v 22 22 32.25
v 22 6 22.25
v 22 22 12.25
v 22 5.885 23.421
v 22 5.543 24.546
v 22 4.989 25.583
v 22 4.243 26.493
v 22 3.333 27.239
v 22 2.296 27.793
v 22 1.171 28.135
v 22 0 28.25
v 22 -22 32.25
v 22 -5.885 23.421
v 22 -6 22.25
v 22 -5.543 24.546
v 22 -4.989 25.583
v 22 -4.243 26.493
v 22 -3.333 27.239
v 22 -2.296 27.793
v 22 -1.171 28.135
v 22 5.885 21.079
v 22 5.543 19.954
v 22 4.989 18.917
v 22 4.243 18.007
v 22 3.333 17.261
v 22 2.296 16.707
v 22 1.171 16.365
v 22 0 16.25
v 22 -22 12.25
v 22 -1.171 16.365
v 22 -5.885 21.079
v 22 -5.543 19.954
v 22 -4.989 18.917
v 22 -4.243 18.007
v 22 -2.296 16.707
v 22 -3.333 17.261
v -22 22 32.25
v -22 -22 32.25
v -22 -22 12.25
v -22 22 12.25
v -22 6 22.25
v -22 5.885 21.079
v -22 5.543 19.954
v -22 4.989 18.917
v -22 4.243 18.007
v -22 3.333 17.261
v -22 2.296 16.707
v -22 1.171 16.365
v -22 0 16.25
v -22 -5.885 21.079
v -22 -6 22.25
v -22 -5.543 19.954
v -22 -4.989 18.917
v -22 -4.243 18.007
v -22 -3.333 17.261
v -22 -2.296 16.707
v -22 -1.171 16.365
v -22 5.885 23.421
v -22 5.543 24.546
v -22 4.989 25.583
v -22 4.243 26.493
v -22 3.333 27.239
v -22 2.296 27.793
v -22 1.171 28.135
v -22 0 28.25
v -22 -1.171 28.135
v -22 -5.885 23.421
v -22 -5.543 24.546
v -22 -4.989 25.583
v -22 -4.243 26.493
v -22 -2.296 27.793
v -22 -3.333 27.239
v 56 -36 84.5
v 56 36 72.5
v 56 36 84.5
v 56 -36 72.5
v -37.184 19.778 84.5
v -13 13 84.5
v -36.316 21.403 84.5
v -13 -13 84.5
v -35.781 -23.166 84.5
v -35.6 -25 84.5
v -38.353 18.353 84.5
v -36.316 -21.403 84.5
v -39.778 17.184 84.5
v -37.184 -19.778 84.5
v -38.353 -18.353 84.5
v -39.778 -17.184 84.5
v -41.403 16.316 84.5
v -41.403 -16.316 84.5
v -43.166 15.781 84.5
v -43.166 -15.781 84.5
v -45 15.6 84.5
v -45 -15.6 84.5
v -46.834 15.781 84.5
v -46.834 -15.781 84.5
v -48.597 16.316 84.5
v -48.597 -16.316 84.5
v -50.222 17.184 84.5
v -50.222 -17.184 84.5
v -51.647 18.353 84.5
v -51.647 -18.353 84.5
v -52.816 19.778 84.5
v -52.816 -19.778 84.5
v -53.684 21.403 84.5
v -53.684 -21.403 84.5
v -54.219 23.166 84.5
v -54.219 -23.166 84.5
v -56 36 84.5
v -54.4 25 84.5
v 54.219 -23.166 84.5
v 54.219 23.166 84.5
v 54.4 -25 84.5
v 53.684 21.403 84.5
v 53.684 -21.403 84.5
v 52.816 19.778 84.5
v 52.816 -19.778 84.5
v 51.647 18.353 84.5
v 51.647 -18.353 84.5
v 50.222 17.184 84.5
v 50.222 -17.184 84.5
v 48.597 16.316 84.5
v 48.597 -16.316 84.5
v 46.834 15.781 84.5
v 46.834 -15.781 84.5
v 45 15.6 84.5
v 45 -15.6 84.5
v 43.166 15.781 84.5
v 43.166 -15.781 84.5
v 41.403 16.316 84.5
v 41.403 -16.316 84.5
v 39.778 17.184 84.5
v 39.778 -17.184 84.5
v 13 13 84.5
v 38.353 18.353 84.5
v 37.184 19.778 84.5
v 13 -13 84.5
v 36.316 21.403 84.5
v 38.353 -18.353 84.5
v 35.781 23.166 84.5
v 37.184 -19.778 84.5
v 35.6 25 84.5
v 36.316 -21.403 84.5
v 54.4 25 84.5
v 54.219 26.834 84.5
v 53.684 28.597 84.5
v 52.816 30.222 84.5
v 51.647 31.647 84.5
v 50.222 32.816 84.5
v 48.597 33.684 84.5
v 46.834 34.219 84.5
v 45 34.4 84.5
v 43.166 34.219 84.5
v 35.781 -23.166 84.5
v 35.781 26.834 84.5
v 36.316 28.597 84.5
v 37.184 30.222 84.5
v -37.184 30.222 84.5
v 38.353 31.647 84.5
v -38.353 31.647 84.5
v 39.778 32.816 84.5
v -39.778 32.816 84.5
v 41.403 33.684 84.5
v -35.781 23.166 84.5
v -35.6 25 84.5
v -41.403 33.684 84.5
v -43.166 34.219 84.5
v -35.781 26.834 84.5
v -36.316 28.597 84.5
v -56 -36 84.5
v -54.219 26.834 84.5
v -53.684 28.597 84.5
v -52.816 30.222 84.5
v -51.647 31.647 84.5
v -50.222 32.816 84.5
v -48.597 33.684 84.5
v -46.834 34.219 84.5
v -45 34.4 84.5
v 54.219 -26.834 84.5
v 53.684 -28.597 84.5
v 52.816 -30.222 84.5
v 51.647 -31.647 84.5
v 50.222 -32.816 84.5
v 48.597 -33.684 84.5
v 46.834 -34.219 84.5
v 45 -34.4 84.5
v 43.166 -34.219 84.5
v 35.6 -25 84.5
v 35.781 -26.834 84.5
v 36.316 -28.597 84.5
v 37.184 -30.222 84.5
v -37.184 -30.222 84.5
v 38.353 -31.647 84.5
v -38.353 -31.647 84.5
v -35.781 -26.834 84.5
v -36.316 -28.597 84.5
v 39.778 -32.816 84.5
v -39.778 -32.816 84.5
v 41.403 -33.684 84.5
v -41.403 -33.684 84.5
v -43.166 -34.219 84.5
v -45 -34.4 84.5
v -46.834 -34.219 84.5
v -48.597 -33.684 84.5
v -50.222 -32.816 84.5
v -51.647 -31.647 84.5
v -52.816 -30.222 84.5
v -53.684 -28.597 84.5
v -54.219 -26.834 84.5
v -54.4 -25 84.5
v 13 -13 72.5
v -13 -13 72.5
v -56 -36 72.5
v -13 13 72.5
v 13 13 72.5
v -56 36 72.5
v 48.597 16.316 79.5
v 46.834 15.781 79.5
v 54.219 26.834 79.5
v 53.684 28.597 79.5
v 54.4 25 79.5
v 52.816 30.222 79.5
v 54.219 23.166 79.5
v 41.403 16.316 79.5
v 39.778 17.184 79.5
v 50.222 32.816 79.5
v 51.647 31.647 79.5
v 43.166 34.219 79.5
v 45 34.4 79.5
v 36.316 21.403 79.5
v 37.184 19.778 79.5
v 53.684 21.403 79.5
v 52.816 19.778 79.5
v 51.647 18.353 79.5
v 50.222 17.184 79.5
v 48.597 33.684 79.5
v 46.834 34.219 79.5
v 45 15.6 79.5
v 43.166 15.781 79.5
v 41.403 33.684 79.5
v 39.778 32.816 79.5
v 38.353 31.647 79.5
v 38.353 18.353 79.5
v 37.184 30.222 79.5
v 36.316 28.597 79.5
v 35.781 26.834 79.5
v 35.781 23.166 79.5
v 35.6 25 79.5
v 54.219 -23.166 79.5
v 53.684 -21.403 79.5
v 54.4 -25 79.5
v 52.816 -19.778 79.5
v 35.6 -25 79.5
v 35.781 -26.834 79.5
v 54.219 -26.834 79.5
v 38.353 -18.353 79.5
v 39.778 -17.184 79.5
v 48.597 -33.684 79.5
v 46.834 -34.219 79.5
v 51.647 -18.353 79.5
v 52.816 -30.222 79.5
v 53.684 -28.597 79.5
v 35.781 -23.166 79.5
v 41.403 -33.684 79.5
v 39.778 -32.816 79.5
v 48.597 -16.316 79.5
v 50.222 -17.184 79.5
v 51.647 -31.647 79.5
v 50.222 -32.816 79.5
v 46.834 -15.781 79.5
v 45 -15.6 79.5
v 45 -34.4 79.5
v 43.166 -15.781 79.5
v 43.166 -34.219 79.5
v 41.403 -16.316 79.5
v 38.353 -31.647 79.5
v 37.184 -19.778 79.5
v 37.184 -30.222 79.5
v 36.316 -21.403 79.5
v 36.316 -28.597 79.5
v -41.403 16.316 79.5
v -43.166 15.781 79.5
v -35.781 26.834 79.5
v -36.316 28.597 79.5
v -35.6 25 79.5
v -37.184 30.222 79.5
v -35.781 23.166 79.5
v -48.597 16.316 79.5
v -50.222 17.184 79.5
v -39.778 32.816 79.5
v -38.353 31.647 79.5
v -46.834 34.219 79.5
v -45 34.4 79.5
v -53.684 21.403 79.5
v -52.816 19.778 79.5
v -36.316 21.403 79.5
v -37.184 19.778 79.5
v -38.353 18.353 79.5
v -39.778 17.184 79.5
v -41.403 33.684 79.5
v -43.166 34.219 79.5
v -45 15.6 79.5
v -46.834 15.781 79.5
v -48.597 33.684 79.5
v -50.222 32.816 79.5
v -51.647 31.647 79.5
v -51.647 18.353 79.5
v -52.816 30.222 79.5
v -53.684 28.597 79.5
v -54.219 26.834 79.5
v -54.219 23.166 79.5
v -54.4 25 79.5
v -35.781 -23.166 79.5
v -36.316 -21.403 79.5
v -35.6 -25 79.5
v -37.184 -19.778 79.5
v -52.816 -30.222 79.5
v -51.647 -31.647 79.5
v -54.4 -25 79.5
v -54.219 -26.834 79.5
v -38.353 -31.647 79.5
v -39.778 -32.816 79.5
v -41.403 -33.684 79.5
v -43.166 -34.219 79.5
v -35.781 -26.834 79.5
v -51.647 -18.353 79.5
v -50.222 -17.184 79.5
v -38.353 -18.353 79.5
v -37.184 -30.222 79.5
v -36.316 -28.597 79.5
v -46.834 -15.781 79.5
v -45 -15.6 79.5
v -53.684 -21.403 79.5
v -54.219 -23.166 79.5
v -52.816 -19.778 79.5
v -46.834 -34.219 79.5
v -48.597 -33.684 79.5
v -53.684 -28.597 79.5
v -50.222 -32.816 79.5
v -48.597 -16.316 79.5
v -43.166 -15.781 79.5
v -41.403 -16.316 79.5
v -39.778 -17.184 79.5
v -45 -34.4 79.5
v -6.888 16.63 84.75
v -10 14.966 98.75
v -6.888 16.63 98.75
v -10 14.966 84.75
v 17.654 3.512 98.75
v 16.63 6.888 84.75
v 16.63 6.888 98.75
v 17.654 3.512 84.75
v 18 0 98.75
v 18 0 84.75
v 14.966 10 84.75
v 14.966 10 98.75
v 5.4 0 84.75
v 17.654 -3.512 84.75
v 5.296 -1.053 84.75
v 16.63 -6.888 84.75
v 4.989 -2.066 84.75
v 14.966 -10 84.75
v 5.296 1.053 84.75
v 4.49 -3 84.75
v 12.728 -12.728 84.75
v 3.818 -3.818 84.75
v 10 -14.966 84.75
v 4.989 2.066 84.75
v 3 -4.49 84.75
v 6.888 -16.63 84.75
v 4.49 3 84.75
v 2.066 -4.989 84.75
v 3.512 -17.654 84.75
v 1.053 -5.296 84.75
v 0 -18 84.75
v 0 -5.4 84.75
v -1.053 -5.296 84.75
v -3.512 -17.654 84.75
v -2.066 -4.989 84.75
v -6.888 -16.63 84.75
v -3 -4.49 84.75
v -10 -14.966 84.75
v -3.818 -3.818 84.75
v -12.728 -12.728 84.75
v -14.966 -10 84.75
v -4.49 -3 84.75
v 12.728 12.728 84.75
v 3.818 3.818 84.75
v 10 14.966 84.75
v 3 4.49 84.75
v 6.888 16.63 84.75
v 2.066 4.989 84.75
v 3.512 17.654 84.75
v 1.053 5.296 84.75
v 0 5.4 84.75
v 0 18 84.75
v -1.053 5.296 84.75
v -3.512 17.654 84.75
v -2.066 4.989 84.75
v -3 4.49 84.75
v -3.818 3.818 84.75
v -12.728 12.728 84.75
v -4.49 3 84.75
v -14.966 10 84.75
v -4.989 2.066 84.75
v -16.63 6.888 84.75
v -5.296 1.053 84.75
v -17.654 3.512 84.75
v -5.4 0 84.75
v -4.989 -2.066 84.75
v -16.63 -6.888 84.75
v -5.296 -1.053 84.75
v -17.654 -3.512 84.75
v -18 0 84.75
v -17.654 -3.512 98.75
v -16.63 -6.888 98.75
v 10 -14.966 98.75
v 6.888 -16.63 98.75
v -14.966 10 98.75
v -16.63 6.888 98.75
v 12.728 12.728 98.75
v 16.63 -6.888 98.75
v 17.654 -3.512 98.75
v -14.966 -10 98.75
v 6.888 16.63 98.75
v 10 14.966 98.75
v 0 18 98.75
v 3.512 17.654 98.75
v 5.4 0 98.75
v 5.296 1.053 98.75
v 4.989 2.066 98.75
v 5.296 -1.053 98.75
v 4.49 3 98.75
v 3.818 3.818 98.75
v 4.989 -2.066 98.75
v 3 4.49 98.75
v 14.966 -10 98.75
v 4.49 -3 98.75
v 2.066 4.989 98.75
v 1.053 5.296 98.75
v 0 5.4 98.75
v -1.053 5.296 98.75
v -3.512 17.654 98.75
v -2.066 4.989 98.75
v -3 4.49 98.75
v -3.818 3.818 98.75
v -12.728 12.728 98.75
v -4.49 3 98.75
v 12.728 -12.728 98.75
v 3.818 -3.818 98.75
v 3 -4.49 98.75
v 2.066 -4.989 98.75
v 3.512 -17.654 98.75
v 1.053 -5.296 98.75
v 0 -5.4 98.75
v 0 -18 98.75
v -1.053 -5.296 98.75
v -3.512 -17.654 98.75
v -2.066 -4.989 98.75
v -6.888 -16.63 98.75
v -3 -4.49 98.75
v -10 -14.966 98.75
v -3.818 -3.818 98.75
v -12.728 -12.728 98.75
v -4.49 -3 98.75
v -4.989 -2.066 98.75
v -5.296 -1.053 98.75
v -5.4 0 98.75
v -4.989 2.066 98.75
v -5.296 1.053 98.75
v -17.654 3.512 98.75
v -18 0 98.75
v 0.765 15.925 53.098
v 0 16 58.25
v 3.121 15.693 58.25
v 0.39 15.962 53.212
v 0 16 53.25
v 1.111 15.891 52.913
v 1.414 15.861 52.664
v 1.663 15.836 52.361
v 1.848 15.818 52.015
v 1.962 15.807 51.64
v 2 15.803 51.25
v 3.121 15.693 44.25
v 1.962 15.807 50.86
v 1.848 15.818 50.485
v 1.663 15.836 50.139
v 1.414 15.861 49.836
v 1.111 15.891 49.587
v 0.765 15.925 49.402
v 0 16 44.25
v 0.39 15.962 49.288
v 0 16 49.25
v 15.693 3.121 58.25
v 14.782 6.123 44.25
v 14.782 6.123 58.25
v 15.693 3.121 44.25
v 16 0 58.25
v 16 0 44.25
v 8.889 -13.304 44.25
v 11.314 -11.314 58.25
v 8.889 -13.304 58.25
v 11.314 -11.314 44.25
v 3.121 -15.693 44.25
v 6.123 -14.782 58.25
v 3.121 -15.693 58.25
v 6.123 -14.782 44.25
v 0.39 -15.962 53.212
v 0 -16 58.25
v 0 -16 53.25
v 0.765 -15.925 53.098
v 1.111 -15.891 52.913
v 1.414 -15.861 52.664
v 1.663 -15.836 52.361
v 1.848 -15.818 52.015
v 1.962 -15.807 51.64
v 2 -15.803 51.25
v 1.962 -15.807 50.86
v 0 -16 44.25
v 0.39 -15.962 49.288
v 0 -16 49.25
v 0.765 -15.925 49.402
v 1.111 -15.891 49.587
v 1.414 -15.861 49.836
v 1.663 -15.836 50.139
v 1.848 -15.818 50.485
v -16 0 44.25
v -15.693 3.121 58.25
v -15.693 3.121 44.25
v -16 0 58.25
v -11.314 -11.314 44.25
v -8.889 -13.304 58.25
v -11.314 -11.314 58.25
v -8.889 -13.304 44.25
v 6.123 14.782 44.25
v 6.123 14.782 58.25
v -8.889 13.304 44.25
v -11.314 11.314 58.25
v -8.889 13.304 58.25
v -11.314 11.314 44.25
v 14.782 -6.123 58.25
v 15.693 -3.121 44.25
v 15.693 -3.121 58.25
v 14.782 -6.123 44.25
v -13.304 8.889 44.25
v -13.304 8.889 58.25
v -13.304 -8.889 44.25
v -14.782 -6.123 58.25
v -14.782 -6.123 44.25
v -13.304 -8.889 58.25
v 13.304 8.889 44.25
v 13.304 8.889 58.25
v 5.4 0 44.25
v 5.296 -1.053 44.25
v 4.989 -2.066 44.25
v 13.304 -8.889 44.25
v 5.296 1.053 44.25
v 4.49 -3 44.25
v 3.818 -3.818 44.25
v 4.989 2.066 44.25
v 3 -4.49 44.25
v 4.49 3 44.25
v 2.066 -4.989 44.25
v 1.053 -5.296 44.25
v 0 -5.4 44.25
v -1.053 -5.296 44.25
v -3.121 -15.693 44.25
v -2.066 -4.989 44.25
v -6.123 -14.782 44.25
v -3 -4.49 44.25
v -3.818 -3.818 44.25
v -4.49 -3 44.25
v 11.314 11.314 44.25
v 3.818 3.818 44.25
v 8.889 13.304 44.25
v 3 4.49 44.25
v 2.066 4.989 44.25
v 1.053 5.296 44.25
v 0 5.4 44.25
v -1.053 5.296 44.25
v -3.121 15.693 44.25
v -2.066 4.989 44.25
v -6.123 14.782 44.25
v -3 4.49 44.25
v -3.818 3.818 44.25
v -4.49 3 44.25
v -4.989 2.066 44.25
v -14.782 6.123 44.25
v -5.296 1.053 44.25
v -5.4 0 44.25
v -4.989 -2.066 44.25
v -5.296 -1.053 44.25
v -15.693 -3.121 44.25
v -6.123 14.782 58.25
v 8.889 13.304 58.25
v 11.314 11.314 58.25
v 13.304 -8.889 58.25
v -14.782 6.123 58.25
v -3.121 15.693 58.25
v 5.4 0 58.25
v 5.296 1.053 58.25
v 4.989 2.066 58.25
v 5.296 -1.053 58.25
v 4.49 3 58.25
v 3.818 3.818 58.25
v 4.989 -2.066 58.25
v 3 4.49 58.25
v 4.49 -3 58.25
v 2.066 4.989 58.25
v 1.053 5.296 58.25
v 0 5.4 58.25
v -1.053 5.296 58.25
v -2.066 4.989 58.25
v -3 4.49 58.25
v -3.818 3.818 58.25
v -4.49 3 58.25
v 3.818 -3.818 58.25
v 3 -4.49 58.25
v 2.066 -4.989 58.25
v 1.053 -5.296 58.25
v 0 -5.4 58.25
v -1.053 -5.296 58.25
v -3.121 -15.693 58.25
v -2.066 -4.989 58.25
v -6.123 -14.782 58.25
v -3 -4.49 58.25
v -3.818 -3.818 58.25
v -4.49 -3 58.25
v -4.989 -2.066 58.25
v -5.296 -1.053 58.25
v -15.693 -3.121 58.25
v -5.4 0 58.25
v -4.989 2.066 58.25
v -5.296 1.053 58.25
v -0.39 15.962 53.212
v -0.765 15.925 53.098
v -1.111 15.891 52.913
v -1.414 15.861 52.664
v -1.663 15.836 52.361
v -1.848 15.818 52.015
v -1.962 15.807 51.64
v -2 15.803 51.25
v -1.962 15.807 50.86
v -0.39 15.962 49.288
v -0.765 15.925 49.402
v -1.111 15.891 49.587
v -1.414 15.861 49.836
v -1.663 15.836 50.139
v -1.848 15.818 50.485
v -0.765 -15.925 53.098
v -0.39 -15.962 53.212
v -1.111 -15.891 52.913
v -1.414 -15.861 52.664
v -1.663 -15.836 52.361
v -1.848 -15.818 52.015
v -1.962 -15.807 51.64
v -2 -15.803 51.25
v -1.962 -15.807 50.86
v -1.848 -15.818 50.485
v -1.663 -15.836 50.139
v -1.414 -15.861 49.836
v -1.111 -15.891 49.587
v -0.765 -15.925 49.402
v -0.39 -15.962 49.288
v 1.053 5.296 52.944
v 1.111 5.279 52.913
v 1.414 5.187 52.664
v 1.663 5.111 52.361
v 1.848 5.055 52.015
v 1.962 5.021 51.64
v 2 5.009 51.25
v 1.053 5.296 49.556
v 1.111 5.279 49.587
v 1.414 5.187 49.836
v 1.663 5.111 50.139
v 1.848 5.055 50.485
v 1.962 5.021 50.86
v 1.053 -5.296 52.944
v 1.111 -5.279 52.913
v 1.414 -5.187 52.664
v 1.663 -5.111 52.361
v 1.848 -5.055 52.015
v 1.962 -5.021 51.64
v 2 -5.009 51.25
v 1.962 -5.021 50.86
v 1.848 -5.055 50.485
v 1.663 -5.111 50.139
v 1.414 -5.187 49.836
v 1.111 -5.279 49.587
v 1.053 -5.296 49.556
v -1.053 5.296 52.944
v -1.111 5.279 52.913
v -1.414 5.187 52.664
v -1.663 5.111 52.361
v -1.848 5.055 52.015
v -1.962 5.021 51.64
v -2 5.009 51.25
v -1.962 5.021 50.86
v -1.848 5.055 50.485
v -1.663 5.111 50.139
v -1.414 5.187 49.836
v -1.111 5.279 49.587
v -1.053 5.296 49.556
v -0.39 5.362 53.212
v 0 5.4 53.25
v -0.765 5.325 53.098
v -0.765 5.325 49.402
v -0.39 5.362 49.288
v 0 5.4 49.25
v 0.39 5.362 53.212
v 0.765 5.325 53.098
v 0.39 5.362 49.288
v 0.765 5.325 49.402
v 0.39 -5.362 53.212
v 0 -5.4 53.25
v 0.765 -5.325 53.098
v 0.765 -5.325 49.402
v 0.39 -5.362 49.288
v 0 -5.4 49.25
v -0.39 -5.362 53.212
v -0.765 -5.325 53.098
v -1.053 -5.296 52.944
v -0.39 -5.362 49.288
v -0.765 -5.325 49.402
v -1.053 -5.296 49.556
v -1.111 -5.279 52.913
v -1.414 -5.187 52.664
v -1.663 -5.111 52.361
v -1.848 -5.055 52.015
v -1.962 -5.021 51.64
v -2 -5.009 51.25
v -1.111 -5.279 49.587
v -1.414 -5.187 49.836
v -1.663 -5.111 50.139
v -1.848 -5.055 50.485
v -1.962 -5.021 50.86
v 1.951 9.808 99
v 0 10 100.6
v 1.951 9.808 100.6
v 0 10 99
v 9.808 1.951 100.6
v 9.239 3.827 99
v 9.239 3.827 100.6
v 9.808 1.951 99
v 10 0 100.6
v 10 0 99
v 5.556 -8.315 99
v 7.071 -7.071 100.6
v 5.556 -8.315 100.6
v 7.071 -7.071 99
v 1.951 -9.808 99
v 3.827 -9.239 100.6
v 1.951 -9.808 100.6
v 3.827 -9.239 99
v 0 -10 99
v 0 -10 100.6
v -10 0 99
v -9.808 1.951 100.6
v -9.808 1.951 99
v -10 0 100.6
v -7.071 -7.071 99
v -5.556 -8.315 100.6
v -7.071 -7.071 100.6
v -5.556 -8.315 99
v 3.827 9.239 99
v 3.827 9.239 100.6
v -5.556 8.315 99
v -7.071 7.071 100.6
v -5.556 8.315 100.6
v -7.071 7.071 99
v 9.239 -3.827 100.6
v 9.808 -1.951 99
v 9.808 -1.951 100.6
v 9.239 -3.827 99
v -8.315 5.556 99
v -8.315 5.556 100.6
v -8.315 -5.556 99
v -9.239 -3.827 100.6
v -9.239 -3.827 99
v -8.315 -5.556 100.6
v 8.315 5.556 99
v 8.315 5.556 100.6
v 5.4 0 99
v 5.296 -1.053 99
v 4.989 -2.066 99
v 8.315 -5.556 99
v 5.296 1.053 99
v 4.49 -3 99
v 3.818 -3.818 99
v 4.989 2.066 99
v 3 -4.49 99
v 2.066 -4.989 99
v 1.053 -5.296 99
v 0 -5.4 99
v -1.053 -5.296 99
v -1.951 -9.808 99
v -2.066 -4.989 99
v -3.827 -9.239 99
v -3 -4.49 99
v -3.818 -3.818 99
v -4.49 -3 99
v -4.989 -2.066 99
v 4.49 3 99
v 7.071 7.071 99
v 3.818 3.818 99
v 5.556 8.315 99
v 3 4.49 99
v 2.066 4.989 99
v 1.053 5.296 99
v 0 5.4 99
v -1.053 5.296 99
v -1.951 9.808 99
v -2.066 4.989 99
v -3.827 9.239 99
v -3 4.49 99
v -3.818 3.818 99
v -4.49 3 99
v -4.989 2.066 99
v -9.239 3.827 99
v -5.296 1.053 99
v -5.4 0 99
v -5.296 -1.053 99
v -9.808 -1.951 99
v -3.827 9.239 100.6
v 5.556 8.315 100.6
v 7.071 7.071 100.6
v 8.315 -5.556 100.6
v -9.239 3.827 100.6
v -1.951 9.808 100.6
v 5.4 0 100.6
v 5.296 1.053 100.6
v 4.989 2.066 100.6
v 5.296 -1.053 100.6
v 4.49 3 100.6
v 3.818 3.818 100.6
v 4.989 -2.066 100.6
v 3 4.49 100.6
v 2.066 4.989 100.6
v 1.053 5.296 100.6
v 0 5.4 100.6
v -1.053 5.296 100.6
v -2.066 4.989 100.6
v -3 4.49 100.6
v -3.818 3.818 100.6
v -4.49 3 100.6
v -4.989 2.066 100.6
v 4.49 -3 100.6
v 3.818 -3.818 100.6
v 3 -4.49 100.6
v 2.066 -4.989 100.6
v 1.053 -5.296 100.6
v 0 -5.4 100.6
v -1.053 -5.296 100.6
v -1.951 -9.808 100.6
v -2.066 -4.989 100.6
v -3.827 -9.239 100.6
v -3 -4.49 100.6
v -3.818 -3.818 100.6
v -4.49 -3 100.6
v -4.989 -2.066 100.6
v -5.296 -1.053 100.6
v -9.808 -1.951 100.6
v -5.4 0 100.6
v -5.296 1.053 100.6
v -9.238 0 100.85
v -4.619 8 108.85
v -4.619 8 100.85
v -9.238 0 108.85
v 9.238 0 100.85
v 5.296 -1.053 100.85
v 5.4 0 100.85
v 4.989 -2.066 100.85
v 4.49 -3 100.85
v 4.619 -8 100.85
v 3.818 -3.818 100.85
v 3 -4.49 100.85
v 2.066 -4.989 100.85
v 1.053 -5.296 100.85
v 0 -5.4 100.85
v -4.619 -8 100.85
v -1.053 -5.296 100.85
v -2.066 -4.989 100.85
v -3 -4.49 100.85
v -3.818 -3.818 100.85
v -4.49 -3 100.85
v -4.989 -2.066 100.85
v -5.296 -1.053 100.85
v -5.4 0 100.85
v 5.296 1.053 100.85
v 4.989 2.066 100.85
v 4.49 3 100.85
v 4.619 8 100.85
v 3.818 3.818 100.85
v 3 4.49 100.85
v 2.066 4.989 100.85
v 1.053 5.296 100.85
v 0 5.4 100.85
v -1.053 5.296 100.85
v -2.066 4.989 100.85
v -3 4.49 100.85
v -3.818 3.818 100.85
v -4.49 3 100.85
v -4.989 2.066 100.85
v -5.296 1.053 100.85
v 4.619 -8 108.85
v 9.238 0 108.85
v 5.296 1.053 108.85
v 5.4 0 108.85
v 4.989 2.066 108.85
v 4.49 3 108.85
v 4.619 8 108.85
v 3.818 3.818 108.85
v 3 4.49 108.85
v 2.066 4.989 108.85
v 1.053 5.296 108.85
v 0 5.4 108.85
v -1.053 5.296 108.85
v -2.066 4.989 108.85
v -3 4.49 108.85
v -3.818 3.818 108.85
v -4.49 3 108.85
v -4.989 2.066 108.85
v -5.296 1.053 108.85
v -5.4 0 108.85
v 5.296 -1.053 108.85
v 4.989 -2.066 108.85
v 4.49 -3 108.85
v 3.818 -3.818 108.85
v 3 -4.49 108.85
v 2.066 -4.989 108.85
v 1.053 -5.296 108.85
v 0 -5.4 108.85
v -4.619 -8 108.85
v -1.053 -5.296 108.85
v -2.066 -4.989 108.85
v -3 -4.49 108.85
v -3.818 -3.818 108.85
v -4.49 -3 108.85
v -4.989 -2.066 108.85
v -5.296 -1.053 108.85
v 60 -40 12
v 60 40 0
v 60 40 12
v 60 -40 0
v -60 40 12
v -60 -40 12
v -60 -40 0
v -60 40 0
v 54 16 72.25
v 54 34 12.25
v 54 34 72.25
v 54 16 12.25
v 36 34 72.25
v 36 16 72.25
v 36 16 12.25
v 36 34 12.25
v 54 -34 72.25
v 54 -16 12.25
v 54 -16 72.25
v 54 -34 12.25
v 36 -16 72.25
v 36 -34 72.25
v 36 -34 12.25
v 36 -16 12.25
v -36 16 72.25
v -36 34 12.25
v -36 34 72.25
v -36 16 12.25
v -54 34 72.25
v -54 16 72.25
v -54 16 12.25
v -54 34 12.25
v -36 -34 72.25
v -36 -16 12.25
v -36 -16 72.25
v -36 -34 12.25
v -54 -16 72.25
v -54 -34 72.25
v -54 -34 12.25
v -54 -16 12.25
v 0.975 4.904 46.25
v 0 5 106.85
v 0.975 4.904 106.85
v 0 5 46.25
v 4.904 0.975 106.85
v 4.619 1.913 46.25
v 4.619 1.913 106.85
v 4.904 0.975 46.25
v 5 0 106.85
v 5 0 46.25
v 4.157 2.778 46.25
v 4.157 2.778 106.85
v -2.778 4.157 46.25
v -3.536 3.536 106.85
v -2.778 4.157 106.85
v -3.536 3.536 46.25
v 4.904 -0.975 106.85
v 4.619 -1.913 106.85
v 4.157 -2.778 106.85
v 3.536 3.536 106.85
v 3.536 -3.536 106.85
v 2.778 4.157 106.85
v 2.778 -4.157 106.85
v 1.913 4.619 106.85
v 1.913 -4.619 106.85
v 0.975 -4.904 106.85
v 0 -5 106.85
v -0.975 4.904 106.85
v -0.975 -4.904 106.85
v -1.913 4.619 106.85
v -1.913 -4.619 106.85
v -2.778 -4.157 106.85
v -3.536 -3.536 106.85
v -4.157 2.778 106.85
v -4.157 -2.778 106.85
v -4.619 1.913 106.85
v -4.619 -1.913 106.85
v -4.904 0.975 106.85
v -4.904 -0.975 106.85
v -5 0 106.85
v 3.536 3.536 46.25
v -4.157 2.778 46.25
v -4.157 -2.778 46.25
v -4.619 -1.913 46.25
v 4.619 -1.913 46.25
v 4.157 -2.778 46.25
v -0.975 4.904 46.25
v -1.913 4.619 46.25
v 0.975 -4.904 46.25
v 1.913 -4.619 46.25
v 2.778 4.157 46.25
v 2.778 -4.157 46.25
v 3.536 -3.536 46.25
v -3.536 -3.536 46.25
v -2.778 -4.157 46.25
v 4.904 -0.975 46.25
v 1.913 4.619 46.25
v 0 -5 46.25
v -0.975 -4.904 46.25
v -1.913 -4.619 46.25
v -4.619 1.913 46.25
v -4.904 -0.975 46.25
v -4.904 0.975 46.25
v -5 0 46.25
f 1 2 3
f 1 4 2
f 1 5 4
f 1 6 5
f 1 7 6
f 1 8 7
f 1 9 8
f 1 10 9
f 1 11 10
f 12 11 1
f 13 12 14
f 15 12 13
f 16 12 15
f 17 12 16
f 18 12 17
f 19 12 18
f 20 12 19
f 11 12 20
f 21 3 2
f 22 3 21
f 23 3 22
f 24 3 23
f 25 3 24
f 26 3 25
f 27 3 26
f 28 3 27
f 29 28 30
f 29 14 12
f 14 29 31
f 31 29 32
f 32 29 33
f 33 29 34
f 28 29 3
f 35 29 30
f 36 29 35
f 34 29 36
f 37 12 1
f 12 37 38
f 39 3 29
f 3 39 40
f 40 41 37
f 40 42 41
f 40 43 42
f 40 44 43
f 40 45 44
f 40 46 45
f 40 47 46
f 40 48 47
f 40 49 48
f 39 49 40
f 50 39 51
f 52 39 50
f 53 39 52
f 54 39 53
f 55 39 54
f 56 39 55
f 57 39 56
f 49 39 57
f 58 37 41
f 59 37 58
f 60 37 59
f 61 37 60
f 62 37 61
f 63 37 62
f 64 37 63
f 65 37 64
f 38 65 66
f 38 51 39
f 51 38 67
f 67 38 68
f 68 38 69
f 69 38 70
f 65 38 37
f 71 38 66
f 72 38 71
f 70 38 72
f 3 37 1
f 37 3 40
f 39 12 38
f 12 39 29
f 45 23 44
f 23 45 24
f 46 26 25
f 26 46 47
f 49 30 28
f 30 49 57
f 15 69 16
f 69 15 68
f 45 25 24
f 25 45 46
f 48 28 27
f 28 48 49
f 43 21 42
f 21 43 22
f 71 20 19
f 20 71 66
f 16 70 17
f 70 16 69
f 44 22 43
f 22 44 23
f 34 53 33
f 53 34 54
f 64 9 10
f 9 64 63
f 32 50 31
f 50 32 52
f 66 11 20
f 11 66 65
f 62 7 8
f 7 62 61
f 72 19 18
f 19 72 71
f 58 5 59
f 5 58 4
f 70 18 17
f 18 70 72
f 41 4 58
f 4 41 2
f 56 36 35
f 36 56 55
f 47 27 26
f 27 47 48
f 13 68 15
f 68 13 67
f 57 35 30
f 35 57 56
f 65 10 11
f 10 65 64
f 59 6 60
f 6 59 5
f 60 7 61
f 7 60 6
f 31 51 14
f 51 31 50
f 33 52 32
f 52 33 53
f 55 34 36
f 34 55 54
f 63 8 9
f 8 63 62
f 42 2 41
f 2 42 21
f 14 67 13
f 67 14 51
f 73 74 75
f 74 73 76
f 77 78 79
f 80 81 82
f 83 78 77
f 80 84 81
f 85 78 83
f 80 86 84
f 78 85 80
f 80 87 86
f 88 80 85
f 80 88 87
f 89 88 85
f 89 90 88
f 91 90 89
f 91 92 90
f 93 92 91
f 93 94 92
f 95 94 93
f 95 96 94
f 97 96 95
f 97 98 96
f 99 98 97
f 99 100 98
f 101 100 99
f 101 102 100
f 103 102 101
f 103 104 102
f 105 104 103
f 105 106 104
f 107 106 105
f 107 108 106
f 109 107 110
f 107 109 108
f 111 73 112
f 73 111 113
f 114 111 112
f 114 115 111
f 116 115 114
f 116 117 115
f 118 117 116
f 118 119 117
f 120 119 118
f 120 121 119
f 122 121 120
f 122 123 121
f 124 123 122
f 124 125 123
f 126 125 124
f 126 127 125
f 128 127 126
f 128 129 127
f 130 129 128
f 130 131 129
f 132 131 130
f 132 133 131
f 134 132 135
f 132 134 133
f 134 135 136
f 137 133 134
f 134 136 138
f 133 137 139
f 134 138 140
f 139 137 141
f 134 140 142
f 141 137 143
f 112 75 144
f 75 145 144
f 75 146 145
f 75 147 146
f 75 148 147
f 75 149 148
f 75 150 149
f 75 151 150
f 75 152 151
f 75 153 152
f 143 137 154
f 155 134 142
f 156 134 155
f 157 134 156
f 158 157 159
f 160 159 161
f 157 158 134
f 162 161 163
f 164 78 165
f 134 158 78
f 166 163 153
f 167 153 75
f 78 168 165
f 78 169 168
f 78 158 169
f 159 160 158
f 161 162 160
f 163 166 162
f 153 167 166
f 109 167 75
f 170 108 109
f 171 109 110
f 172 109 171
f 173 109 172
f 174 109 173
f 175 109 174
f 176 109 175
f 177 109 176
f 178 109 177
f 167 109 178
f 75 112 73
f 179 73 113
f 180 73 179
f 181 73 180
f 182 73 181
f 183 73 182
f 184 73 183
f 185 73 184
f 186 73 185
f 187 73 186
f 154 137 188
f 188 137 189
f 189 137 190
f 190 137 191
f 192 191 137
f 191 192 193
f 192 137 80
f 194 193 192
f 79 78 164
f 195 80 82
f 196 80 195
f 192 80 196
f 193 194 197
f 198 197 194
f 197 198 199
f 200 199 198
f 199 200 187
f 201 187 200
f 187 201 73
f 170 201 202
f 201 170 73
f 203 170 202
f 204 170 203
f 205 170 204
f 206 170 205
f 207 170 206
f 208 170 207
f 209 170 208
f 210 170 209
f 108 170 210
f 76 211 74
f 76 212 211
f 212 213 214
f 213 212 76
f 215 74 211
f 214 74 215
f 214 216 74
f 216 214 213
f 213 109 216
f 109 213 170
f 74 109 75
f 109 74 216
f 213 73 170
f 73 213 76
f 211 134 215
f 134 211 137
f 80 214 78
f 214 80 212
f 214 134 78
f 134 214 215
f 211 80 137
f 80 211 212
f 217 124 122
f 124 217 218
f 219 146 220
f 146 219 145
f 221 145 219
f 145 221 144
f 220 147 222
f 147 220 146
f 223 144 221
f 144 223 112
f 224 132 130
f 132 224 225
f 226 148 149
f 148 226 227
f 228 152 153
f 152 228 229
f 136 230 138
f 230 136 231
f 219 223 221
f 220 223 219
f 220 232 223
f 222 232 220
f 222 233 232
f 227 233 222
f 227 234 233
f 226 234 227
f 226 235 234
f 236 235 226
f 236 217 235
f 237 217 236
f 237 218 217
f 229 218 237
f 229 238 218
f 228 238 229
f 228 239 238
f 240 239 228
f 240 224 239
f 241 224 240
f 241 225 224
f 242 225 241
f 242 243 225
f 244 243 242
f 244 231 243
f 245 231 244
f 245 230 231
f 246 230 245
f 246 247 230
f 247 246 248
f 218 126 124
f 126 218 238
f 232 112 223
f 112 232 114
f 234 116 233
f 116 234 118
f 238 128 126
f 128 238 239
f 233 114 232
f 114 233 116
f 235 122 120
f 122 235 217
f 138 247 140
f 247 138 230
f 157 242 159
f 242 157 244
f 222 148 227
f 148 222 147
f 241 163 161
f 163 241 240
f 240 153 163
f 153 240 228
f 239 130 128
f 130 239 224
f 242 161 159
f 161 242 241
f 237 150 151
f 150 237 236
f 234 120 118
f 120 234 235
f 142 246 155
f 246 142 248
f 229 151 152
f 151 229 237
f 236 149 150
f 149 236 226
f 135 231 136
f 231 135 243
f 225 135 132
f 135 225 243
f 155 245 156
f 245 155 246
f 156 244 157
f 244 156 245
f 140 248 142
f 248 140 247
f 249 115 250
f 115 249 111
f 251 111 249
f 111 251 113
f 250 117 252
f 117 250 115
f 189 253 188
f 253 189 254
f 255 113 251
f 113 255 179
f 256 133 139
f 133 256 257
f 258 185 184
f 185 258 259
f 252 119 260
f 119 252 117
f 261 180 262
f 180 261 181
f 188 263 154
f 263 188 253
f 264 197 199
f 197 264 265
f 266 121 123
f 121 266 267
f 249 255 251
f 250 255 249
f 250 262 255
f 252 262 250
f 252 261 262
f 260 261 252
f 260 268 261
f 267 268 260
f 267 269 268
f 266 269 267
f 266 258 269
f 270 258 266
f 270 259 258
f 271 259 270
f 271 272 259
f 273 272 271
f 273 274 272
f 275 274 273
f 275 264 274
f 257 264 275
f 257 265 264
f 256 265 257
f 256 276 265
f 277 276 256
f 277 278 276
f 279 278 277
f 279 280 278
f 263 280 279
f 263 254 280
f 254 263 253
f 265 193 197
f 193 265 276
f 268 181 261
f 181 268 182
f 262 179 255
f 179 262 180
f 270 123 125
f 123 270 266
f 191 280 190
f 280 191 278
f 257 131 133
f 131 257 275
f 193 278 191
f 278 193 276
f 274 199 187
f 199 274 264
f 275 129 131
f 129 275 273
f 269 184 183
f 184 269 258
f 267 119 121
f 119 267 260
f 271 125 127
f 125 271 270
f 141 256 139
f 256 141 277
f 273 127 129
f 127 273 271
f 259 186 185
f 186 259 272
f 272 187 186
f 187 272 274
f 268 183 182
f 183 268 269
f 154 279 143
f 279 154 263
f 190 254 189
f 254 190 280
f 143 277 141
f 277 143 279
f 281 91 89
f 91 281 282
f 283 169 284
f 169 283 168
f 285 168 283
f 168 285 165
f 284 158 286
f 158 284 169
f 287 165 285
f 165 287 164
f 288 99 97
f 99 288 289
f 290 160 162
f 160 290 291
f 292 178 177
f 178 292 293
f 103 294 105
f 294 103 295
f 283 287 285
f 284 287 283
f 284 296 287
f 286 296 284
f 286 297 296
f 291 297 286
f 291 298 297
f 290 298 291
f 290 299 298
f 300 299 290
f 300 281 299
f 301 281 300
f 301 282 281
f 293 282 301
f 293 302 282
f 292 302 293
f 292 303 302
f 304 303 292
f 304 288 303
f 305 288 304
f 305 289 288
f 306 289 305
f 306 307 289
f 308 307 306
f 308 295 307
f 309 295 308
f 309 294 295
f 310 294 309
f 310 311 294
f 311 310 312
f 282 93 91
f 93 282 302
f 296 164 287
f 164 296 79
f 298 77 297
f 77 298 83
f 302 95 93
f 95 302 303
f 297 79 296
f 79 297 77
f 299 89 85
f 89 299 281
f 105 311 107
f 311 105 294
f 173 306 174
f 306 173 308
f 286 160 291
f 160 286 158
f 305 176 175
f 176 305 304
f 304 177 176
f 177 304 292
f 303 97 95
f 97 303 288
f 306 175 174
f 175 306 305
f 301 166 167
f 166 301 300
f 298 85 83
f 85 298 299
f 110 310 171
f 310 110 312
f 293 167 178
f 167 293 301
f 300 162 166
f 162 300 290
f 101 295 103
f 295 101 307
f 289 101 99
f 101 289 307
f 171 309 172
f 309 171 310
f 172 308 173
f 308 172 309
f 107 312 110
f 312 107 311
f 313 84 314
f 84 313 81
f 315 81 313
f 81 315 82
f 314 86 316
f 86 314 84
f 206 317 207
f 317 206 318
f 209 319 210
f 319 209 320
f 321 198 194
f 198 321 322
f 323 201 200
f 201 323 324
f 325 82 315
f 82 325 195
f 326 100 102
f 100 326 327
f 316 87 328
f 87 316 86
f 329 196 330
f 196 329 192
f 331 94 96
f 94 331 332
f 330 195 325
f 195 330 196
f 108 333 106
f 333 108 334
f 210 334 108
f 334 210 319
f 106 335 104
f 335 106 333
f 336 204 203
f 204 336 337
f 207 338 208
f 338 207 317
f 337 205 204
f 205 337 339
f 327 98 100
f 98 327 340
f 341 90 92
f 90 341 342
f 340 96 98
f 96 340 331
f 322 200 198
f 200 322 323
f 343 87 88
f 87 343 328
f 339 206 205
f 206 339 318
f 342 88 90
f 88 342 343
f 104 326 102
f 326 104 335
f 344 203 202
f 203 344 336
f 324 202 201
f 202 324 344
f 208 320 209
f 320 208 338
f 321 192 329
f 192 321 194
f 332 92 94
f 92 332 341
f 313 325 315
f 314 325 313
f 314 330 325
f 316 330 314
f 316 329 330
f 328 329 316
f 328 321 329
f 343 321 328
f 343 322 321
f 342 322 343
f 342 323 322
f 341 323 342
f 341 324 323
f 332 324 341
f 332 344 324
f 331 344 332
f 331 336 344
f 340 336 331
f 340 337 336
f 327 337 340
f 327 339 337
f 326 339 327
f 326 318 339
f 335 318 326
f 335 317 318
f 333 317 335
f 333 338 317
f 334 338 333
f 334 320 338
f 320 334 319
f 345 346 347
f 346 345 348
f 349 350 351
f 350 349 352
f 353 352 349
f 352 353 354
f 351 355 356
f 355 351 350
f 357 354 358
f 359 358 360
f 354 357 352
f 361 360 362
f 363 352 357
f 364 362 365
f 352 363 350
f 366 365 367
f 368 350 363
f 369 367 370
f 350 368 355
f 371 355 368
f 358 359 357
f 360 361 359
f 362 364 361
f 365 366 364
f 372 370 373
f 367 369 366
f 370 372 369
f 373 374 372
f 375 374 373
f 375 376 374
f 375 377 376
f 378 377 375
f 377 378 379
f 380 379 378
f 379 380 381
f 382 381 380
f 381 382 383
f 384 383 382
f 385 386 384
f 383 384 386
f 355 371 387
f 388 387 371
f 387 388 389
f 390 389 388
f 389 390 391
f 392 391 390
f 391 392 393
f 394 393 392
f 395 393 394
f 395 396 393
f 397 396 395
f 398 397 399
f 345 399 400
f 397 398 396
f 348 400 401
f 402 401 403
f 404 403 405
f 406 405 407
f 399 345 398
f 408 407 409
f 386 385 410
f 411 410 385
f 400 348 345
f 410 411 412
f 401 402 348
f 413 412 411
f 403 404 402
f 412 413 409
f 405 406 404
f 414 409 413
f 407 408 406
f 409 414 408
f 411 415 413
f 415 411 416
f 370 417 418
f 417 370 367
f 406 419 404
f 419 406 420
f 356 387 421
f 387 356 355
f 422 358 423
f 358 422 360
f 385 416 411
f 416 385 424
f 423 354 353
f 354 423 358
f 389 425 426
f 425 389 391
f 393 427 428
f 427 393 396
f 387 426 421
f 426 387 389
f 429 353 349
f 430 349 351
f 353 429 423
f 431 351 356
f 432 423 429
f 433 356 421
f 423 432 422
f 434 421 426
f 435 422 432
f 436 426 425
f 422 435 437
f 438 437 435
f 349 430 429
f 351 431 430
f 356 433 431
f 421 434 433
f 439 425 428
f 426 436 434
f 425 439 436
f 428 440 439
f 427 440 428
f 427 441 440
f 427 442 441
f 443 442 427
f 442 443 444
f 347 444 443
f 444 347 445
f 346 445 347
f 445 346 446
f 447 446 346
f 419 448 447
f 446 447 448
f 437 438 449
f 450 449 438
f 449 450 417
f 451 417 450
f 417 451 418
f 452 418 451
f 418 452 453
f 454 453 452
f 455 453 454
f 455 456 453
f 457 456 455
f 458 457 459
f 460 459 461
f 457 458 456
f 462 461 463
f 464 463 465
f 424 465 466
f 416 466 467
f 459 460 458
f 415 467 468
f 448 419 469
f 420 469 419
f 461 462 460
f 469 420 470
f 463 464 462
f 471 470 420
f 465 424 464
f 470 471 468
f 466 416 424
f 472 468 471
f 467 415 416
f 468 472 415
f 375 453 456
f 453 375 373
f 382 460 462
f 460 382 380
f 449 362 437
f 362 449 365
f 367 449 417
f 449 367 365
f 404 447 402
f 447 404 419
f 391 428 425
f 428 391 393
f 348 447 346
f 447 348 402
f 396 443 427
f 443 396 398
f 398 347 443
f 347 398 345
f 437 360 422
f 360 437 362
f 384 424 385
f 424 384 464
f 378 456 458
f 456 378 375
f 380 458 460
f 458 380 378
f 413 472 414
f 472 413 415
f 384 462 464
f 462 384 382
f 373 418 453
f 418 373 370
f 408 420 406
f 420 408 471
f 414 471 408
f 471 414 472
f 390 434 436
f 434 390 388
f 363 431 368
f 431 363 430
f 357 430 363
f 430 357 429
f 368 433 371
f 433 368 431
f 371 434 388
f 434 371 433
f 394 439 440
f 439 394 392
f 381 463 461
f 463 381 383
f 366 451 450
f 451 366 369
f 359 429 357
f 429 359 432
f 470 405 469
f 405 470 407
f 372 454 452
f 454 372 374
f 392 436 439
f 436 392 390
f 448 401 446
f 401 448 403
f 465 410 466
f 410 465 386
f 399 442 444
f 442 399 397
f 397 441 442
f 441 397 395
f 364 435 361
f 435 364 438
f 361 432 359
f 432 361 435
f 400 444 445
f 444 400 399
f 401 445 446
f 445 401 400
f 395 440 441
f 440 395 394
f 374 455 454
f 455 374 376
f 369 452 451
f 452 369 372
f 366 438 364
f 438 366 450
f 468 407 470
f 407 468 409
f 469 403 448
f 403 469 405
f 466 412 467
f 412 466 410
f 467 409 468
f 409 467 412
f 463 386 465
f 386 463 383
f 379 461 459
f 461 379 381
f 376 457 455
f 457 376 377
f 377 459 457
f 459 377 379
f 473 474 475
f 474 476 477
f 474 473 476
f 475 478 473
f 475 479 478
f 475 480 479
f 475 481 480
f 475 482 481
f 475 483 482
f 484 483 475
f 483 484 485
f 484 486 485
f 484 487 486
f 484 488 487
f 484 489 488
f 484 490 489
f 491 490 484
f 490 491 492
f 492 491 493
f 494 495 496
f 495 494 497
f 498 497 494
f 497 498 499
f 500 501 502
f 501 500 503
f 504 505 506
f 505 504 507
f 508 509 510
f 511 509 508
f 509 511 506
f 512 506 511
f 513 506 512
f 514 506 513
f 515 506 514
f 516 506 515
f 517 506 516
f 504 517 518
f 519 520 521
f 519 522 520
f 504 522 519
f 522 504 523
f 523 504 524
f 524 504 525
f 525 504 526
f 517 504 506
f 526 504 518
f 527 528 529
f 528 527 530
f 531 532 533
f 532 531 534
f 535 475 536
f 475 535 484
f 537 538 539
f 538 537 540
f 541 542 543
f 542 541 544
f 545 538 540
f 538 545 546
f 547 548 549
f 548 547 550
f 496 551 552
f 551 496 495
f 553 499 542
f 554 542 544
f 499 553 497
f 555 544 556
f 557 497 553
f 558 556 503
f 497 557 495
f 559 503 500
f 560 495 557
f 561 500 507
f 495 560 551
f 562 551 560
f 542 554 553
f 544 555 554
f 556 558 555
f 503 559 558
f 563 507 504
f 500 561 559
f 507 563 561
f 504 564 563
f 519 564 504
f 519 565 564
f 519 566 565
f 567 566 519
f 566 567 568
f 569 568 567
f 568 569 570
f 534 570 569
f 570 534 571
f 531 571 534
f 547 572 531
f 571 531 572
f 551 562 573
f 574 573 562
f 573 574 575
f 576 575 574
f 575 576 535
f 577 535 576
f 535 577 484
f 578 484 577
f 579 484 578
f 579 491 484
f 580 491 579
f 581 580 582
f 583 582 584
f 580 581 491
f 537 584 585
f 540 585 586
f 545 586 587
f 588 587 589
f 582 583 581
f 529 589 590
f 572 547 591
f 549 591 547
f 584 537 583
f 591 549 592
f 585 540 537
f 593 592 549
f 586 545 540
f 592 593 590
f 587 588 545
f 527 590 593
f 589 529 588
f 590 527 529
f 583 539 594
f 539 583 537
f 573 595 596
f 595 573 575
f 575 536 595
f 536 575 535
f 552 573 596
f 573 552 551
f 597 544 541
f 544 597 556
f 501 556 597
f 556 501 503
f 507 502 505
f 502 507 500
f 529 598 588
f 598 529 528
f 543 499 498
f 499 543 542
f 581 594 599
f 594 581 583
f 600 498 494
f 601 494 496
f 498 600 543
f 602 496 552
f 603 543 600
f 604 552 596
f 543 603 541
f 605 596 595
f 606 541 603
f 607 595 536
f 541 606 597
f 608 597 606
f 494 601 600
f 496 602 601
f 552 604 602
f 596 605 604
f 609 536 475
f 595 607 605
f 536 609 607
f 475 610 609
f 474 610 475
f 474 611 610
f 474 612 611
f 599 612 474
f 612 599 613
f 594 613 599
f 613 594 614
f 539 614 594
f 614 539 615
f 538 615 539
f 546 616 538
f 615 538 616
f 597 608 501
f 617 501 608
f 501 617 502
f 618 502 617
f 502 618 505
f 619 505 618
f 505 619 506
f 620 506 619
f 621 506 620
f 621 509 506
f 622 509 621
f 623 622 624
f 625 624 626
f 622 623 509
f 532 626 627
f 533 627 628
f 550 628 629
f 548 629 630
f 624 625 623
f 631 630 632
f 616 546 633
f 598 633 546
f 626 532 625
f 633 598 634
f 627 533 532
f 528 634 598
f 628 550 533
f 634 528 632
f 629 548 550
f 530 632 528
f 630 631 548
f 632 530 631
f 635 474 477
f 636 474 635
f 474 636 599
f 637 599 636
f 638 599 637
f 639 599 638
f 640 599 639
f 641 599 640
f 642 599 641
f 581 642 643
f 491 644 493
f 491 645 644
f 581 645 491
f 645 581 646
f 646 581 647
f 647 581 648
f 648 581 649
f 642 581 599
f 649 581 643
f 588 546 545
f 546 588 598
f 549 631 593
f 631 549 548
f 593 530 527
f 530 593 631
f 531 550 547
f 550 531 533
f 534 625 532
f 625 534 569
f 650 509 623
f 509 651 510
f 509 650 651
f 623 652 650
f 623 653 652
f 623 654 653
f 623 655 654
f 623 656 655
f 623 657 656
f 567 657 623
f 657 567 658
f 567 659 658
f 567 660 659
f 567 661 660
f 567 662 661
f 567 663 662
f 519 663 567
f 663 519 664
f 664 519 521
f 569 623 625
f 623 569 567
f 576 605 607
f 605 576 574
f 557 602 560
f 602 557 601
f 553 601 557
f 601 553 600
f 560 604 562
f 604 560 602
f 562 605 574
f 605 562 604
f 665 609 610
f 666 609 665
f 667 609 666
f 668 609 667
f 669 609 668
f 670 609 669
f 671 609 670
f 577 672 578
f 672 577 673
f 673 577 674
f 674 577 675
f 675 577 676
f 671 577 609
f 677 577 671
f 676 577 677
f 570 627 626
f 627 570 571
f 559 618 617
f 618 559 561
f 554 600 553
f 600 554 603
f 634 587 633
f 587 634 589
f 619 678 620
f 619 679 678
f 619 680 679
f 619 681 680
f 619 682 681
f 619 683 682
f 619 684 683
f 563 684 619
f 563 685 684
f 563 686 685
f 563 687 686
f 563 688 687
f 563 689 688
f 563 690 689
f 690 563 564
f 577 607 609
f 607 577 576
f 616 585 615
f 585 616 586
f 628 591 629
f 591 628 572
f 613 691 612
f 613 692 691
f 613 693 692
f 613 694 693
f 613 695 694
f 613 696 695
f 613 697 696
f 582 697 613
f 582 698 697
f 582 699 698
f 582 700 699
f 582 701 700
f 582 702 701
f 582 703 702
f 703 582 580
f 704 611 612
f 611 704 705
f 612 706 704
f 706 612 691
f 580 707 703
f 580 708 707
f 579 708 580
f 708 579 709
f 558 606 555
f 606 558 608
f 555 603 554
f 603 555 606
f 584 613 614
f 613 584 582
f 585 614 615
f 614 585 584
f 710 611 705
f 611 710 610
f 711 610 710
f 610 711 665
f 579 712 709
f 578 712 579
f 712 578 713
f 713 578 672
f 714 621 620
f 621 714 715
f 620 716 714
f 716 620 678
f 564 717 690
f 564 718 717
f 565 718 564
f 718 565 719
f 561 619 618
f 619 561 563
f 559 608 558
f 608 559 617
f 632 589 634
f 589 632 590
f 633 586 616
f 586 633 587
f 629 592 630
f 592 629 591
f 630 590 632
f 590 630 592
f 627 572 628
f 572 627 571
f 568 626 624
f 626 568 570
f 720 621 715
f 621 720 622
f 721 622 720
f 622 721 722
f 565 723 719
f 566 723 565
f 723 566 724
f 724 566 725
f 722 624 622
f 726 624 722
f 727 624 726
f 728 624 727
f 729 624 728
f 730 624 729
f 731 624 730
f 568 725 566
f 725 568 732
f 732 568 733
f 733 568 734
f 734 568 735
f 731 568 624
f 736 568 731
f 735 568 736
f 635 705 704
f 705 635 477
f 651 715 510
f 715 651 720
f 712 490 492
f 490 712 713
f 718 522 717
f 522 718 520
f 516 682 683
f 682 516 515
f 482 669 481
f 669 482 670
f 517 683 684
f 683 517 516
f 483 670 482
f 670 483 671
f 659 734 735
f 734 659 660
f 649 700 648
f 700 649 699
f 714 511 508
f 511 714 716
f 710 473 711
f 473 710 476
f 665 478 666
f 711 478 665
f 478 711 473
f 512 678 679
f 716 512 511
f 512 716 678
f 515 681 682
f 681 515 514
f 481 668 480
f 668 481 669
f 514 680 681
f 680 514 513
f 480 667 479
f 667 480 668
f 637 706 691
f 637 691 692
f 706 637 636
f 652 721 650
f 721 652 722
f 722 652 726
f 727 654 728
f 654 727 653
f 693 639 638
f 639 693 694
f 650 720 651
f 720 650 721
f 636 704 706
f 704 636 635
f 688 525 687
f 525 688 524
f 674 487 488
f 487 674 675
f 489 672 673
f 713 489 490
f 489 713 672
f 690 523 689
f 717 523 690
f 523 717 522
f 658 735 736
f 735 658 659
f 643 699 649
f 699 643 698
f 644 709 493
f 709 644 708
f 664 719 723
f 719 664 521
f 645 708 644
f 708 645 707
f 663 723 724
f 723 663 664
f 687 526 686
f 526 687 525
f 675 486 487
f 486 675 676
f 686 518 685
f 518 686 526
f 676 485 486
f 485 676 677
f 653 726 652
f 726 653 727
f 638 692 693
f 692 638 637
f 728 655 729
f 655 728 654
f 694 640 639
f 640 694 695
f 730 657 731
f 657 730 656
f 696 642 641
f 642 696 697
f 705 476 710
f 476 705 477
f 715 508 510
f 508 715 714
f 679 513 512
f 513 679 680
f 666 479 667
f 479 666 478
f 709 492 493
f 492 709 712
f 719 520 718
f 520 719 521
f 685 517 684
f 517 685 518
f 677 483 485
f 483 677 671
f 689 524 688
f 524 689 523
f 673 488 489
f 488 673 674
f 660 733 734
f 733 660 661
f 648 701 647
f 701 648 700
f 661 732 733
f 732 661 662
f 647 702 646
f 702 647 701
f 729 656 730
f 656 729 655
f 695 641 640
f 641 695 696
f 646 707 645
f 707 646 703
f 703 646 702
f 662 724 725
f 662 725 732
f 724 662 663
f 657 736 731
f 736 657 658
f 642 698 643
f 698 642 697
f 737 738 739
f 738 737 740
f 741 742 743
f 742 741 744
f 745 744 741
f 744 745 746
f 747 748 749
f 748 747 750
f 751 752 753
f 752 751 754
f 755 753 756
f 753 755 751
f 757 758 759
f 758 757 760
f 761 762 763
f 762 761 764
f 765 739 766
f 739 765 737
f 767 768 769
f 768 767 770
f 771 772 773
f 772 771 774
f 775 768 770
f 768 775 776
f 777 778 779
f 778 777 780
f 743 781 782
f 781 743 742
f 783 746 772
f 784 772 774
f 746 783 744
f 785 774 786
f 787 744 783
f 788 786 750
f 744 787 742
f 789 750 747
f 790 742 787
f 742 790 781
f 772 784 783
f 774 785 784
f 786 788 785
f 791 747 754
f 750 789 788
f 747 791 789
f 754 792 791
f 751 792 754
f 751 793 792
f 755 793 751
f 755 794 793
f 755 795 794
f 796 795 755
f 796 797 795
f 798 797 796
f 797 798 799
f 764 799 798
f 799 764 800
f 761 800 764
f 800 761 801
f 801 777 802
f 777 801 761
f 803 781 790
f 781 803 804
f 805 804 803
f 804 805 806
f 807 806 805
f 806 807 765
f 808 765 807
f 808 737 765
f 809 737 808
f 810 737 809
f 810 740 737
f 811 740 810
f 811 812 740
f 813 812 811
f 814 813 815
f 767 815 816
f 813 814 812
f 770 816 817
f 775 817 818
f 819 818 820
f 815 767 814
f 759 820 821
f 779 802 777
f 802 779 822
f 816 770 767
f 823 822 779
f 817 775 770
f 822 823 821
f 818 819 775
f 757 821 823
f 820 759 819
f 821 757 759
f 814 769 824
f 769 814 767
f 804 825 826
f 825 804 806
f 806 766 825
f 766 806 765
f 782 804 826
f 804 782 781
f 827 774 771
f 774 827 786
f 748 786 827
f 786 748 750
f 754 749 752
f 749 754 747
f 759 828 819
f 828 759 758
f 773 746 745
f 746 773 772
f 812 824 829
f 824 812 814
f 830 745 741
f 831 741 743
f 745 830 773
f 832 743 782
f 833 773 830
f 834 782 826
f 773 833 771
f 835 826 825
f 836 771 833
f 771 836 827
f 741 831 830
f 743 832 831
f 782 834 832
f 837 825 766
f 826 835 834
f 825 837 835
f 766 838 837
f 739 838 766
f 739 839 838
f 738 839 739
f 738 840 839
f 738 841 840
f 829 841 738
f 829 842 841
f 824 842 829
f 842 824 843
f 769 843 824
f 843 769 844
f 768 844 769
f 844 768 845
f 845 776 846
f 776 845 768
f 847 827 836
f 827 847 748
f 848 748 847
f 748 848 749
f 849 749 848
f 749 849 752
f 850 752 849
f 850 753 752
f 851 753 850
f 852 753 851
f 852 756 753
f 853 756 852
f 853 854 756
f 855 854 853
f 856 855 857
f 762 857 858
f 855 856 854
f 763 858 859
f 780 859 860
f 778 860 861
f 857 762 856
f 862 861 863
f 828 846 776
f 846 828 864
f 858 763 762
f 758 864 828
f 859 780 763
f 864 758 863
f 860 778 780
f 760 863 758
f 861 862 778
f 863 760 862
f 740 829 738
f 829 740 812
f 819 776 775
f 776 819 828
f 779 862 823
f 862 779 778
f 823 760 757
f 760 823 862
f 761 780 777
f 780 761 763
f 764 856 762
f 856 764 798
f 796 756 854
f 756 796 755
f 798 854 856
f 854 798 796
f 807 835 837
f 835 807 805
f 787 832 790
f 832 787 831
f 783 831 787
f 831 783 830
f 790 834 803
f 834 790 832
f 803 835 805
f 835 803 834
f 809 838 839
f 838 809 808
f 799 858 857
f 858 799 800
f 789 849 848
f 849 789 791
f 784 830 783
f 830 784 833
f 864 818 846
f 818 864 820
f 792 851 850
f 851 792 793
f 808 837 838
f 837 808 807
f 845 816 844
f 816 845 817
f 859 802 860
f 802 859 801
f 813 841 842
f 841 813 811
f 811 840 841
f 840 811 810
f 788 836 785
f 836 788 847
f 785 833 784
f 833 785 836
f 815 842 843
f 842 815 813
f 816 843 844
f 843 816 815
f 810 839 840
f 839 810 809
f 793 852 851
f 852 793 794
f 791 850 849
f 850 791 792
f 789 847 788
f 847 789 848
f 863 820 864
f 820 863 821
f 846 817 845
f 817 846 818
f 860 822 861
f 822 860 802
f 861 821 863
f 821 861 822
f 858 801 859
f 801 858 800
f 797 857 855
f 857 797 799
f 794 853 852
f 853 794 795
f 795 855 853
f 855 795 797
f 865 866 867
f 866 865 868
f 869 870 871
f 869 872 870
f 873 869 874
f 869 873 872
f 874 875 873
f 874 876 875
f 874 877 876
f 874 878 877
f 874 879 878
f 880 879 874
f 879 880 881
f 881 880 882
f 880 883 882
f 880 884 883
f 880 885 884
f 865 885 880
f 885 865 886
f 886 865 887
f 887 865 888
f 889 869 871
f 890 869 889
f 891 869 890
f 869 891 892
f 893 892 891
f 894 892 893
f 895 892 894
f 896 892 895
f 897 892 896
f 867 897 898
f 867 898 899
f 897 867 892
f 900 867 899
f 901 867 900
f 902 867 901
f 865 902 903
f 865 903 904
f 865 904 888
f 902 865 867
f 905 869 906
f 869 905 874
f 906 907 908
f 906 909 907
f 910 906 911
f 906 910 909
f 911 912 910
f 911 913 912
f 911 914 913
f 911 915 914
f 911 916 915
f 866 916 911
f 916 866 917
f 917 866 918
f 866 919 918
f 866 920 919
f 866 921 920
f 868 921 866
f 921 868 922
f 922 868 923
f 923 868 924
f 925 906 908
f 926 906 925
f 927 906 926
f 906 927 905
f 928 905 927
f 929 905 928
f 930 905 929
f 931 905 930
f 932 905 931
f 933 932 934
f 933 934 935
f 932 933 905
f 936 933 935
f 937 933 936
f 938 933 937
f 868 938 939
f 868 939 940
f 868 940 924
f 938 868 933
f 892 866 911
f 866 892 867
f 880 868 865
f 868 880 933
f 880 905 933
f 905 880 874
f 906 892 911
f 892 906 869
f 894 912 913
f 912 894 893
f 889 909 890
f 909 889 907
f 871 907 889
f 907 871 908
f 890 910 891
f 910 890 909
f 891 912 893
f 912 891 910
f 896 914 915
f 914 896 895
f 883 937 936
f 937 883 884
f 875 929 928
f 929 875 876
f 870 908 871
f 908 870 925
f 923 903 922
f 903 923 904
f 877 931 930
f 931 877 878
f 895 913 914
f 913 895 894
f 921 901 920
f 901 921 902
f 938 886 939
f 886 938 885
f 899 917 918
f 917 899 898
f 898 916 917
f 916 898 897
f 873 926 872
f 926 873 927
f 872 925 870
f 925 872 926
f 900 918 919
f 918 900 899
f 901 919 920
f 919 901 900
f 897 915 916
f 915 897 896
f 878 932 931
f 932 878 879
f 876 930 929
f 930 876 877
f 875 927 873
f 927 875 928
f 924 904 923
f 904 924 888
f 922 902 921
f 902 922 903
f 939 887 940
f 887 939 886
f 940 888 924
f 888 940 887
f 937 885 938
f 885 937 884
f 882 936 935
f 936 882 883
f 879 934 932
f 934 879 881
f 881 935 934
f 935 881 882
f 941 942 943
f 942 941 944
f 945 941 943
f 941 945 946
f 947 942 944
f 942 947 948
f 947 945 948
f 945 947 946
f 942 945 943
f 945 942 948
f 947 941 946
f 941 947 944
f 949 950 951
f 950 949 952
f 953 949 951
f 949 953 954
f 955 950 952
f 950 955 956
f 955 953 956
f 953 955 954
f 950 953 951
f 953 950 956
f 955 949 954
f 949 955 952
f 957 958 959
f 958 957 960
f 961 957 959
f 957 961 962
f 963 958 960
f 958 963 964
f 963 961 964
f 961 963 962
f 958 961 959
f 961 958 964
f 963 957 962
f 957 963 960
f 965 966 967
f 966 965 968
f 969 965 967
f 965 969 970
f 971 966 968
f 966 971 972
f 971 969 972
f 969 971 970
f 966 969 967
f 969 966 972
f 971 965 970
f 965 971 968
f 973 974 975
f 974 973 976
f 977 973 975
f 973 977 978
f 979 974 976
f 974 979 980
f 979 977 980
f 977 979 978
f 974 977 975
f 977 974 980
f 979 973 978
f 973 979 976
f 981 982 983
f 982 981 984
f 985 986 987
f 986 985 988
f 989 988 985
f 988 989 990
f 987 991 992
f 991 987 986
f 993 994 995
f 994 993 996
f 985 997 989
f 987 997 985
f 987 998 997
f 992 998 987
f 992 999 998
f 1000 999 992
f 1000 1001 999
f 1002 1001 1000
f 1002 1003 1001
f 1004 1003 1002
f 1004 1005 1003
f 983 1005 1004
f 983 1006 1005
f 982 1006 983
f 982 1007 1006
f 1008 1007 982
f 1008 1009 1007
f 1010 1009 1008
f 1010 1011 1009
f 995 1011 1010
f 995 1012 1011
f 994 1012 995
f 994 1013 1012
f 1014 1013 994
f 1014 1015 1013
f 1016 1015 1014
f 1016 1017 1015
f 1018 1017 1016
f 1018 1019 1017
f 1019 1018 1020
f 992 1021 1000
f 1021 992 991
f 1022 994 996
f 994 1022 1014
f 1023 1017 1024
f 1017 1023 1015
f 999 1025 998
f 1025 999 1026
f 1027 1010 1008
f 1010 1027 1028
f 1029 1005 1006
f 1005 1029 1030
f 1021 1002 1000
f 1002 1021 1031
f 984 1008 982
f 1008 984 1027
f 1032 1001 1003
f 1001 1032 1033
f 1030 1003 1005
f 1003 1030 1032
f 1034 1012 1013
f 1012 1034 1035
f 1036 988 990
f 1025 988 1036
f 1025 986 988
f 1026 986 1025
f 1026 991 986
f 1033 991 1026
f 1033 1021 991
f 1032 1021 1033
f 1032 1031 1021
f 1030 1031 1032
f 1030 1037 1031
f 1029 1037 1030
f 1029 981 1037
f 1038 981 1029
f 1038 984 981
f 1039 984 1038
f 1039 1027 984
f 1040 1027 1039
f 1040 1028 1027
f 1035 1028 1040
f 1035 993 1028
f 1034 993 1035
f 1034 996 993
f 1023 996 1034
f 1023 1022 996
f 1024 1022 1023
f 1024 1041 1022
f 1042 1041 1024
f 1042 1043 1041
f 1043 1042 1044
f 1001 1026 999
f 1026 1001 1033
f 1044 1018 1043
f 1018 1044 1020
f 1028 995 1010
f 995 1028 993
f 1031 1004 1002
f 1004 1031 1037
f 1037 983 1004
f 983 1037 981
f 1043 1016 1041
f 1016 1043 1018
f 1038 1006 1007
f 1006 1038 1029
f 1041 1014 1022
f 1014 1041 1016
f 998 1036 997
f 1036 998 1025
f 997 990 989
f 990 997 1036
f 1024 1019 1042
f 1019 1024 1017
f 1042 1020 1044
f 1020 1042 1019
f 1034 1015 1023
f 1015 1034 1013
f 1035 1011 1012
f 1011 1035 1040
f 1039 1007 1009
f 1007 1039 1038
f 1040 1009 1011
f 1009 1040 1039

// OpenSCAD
$fn = 32;

// ------------------------------------------------------------------------
// Arbor press fixture: screw d10, posts 60 mm, gap 12 mm
// Every part is its own module, assembly() places every instance.
// ------------------------------------------------------------------------

// --- part 1 ---
module press_bed() {
  difference() {
    translate([-60, -40, 0]) cube([120, 80, 12]);
  }
}

// --- part 2 ---
module anvil_block() {
  difference() {
    translate([-22, -22, 0]) cube([44, 44, 20]);
    translate([0, 0, 10]) rotate([0, 90, 0]) cylinder(h = 46, d = 12, center = true);
  }
}

// --- part 3 ---
module press_post_a() {
  translate([-9, -9, 0]) cube([18, 18, 60]);
}

// --- part 4 ---
module press_post_b() {
  translate([-9, -9, 0]) cube([18, 18, 60]);
}

// --- part 5 ---
module press_post_c() {
  translate([-9, -9, 0]) cube([18, 18, 60]);
}

// --- part 6 ---
module press_post_d() {
  translate([-9, -9, 0]) cube([18, 18, 60]);
}

// --- part 7 ---
module press_frame() {
  difference() {
    translate([-56, -36, 0]) cube([112, 72, 12]);
    translate([-13, -13, -1]) cube([26, 26, 14]);
    translate([45, 25, 7]) cylinder(h = 6, d = 18.8);
    translate([45, -25, 7]) cylinder(h = 6, d = 18.8);
    translate([-45, 25, 7]) cylinder(h = 6, d = 18.8);
    translate([-45, -25, 7]) cylinder(h = 6, d = 18.8);
  }
}

// --- part 8 ---
module guide_ring() {
  difference() {
      translate([0, 0, 0]) cylinder(h = 14, d = 36);
      translate([0, 0, -1]) cylinder(h = 16, d = 10.8);
    }
}

// --- part 9 ---
module press_screw() {
  translate([0, 0, -30.3]) cylinder(h = 60.6, d = 10);
}

// --- part 10 ---
module press_head() {
  difference() {
    cylinder(h = 14, d = 32);
    translate([0, 0, -1]) cylinder(h = 16, d = 10.8);
    translate([0, 0, 7]) rotate([90, 0, 0]) cylinder(h = 34, d = 4, center = true);
  }
}

// --- part 11 ---
module nut_washer() {
  difference() {
      translate([0, 0, 0]) cylinder(h = 1.6, d = 20);
      translate([0, 0, -1]) cylinder(h = 3.6, d = 10.8);
    }
}

// --- part 12 ---
module press_nut() {
  difference() {
    linear_extrude(height = 8) polygon(points = [[9.238, 0], [4.619, 8], [-4.619, 8], [-9.238, 0], [-4.619, -8], [4.619, -8]]);
    translate([0, 0, -1]) cylinder(h = 10, d = 10.8);
  }
}

// --- assembly ---
module assembly() {
  color([0.80, 0.24, 0.20]) translate([0, 0, 0]) rotate([0, 0, 0]) press_bed();
  color([0.20, 0.45, 0.75]) translate([0, 0, 12.25]) rotate([0, 0, 0]) anvil_block();
  color([0.25, 0.62, 0.32]) translate([45, 25, 12.25]) rotate([0, 0, 0]) press_post_a();
  color([0.92, 0.70, 0.18]) translate([45, -25, 12.25]) rotate([0, 0, 0]) press_post_b();
  color([0.58, 0.35, 0.70]) translate([-45, 25, 12.25]) rotate([0, 0, 0]) press_post_c();
  color([0.16, 0.66, 0.66]) translate([-45, -25, 12.25]) rotate([0, 0, 0]) press_post_d();
  color([0.85, 0.48, 0.18]) translate([0, 0, 72.5]) rotate([0, 0, 0]) press_frame();
  color([0.55, 0.60, 0.65]) translate([0, 0, 84.75]) rotate([0, 0, 0]) guide_ring();
  color([0.75, 0.30, 0.55]) translate([0, 0, 76.55]) rotate([0, 0, 0]) press_screw();
  color([0.42, 0.52, 0.28]) translate([0, 0, 44.25]) rotate([0, 0, 0]) press_head();
  color([0.80, 0.24, 0.20]) translate([0, 0, 99]) rotate([0, 0, 0]) nut_washer();
  color([0.20, 0.45, 0.75]) translate([0, 0, 100.85]) rotate([0, 0, 0]) press_nut();
}

assembly();
